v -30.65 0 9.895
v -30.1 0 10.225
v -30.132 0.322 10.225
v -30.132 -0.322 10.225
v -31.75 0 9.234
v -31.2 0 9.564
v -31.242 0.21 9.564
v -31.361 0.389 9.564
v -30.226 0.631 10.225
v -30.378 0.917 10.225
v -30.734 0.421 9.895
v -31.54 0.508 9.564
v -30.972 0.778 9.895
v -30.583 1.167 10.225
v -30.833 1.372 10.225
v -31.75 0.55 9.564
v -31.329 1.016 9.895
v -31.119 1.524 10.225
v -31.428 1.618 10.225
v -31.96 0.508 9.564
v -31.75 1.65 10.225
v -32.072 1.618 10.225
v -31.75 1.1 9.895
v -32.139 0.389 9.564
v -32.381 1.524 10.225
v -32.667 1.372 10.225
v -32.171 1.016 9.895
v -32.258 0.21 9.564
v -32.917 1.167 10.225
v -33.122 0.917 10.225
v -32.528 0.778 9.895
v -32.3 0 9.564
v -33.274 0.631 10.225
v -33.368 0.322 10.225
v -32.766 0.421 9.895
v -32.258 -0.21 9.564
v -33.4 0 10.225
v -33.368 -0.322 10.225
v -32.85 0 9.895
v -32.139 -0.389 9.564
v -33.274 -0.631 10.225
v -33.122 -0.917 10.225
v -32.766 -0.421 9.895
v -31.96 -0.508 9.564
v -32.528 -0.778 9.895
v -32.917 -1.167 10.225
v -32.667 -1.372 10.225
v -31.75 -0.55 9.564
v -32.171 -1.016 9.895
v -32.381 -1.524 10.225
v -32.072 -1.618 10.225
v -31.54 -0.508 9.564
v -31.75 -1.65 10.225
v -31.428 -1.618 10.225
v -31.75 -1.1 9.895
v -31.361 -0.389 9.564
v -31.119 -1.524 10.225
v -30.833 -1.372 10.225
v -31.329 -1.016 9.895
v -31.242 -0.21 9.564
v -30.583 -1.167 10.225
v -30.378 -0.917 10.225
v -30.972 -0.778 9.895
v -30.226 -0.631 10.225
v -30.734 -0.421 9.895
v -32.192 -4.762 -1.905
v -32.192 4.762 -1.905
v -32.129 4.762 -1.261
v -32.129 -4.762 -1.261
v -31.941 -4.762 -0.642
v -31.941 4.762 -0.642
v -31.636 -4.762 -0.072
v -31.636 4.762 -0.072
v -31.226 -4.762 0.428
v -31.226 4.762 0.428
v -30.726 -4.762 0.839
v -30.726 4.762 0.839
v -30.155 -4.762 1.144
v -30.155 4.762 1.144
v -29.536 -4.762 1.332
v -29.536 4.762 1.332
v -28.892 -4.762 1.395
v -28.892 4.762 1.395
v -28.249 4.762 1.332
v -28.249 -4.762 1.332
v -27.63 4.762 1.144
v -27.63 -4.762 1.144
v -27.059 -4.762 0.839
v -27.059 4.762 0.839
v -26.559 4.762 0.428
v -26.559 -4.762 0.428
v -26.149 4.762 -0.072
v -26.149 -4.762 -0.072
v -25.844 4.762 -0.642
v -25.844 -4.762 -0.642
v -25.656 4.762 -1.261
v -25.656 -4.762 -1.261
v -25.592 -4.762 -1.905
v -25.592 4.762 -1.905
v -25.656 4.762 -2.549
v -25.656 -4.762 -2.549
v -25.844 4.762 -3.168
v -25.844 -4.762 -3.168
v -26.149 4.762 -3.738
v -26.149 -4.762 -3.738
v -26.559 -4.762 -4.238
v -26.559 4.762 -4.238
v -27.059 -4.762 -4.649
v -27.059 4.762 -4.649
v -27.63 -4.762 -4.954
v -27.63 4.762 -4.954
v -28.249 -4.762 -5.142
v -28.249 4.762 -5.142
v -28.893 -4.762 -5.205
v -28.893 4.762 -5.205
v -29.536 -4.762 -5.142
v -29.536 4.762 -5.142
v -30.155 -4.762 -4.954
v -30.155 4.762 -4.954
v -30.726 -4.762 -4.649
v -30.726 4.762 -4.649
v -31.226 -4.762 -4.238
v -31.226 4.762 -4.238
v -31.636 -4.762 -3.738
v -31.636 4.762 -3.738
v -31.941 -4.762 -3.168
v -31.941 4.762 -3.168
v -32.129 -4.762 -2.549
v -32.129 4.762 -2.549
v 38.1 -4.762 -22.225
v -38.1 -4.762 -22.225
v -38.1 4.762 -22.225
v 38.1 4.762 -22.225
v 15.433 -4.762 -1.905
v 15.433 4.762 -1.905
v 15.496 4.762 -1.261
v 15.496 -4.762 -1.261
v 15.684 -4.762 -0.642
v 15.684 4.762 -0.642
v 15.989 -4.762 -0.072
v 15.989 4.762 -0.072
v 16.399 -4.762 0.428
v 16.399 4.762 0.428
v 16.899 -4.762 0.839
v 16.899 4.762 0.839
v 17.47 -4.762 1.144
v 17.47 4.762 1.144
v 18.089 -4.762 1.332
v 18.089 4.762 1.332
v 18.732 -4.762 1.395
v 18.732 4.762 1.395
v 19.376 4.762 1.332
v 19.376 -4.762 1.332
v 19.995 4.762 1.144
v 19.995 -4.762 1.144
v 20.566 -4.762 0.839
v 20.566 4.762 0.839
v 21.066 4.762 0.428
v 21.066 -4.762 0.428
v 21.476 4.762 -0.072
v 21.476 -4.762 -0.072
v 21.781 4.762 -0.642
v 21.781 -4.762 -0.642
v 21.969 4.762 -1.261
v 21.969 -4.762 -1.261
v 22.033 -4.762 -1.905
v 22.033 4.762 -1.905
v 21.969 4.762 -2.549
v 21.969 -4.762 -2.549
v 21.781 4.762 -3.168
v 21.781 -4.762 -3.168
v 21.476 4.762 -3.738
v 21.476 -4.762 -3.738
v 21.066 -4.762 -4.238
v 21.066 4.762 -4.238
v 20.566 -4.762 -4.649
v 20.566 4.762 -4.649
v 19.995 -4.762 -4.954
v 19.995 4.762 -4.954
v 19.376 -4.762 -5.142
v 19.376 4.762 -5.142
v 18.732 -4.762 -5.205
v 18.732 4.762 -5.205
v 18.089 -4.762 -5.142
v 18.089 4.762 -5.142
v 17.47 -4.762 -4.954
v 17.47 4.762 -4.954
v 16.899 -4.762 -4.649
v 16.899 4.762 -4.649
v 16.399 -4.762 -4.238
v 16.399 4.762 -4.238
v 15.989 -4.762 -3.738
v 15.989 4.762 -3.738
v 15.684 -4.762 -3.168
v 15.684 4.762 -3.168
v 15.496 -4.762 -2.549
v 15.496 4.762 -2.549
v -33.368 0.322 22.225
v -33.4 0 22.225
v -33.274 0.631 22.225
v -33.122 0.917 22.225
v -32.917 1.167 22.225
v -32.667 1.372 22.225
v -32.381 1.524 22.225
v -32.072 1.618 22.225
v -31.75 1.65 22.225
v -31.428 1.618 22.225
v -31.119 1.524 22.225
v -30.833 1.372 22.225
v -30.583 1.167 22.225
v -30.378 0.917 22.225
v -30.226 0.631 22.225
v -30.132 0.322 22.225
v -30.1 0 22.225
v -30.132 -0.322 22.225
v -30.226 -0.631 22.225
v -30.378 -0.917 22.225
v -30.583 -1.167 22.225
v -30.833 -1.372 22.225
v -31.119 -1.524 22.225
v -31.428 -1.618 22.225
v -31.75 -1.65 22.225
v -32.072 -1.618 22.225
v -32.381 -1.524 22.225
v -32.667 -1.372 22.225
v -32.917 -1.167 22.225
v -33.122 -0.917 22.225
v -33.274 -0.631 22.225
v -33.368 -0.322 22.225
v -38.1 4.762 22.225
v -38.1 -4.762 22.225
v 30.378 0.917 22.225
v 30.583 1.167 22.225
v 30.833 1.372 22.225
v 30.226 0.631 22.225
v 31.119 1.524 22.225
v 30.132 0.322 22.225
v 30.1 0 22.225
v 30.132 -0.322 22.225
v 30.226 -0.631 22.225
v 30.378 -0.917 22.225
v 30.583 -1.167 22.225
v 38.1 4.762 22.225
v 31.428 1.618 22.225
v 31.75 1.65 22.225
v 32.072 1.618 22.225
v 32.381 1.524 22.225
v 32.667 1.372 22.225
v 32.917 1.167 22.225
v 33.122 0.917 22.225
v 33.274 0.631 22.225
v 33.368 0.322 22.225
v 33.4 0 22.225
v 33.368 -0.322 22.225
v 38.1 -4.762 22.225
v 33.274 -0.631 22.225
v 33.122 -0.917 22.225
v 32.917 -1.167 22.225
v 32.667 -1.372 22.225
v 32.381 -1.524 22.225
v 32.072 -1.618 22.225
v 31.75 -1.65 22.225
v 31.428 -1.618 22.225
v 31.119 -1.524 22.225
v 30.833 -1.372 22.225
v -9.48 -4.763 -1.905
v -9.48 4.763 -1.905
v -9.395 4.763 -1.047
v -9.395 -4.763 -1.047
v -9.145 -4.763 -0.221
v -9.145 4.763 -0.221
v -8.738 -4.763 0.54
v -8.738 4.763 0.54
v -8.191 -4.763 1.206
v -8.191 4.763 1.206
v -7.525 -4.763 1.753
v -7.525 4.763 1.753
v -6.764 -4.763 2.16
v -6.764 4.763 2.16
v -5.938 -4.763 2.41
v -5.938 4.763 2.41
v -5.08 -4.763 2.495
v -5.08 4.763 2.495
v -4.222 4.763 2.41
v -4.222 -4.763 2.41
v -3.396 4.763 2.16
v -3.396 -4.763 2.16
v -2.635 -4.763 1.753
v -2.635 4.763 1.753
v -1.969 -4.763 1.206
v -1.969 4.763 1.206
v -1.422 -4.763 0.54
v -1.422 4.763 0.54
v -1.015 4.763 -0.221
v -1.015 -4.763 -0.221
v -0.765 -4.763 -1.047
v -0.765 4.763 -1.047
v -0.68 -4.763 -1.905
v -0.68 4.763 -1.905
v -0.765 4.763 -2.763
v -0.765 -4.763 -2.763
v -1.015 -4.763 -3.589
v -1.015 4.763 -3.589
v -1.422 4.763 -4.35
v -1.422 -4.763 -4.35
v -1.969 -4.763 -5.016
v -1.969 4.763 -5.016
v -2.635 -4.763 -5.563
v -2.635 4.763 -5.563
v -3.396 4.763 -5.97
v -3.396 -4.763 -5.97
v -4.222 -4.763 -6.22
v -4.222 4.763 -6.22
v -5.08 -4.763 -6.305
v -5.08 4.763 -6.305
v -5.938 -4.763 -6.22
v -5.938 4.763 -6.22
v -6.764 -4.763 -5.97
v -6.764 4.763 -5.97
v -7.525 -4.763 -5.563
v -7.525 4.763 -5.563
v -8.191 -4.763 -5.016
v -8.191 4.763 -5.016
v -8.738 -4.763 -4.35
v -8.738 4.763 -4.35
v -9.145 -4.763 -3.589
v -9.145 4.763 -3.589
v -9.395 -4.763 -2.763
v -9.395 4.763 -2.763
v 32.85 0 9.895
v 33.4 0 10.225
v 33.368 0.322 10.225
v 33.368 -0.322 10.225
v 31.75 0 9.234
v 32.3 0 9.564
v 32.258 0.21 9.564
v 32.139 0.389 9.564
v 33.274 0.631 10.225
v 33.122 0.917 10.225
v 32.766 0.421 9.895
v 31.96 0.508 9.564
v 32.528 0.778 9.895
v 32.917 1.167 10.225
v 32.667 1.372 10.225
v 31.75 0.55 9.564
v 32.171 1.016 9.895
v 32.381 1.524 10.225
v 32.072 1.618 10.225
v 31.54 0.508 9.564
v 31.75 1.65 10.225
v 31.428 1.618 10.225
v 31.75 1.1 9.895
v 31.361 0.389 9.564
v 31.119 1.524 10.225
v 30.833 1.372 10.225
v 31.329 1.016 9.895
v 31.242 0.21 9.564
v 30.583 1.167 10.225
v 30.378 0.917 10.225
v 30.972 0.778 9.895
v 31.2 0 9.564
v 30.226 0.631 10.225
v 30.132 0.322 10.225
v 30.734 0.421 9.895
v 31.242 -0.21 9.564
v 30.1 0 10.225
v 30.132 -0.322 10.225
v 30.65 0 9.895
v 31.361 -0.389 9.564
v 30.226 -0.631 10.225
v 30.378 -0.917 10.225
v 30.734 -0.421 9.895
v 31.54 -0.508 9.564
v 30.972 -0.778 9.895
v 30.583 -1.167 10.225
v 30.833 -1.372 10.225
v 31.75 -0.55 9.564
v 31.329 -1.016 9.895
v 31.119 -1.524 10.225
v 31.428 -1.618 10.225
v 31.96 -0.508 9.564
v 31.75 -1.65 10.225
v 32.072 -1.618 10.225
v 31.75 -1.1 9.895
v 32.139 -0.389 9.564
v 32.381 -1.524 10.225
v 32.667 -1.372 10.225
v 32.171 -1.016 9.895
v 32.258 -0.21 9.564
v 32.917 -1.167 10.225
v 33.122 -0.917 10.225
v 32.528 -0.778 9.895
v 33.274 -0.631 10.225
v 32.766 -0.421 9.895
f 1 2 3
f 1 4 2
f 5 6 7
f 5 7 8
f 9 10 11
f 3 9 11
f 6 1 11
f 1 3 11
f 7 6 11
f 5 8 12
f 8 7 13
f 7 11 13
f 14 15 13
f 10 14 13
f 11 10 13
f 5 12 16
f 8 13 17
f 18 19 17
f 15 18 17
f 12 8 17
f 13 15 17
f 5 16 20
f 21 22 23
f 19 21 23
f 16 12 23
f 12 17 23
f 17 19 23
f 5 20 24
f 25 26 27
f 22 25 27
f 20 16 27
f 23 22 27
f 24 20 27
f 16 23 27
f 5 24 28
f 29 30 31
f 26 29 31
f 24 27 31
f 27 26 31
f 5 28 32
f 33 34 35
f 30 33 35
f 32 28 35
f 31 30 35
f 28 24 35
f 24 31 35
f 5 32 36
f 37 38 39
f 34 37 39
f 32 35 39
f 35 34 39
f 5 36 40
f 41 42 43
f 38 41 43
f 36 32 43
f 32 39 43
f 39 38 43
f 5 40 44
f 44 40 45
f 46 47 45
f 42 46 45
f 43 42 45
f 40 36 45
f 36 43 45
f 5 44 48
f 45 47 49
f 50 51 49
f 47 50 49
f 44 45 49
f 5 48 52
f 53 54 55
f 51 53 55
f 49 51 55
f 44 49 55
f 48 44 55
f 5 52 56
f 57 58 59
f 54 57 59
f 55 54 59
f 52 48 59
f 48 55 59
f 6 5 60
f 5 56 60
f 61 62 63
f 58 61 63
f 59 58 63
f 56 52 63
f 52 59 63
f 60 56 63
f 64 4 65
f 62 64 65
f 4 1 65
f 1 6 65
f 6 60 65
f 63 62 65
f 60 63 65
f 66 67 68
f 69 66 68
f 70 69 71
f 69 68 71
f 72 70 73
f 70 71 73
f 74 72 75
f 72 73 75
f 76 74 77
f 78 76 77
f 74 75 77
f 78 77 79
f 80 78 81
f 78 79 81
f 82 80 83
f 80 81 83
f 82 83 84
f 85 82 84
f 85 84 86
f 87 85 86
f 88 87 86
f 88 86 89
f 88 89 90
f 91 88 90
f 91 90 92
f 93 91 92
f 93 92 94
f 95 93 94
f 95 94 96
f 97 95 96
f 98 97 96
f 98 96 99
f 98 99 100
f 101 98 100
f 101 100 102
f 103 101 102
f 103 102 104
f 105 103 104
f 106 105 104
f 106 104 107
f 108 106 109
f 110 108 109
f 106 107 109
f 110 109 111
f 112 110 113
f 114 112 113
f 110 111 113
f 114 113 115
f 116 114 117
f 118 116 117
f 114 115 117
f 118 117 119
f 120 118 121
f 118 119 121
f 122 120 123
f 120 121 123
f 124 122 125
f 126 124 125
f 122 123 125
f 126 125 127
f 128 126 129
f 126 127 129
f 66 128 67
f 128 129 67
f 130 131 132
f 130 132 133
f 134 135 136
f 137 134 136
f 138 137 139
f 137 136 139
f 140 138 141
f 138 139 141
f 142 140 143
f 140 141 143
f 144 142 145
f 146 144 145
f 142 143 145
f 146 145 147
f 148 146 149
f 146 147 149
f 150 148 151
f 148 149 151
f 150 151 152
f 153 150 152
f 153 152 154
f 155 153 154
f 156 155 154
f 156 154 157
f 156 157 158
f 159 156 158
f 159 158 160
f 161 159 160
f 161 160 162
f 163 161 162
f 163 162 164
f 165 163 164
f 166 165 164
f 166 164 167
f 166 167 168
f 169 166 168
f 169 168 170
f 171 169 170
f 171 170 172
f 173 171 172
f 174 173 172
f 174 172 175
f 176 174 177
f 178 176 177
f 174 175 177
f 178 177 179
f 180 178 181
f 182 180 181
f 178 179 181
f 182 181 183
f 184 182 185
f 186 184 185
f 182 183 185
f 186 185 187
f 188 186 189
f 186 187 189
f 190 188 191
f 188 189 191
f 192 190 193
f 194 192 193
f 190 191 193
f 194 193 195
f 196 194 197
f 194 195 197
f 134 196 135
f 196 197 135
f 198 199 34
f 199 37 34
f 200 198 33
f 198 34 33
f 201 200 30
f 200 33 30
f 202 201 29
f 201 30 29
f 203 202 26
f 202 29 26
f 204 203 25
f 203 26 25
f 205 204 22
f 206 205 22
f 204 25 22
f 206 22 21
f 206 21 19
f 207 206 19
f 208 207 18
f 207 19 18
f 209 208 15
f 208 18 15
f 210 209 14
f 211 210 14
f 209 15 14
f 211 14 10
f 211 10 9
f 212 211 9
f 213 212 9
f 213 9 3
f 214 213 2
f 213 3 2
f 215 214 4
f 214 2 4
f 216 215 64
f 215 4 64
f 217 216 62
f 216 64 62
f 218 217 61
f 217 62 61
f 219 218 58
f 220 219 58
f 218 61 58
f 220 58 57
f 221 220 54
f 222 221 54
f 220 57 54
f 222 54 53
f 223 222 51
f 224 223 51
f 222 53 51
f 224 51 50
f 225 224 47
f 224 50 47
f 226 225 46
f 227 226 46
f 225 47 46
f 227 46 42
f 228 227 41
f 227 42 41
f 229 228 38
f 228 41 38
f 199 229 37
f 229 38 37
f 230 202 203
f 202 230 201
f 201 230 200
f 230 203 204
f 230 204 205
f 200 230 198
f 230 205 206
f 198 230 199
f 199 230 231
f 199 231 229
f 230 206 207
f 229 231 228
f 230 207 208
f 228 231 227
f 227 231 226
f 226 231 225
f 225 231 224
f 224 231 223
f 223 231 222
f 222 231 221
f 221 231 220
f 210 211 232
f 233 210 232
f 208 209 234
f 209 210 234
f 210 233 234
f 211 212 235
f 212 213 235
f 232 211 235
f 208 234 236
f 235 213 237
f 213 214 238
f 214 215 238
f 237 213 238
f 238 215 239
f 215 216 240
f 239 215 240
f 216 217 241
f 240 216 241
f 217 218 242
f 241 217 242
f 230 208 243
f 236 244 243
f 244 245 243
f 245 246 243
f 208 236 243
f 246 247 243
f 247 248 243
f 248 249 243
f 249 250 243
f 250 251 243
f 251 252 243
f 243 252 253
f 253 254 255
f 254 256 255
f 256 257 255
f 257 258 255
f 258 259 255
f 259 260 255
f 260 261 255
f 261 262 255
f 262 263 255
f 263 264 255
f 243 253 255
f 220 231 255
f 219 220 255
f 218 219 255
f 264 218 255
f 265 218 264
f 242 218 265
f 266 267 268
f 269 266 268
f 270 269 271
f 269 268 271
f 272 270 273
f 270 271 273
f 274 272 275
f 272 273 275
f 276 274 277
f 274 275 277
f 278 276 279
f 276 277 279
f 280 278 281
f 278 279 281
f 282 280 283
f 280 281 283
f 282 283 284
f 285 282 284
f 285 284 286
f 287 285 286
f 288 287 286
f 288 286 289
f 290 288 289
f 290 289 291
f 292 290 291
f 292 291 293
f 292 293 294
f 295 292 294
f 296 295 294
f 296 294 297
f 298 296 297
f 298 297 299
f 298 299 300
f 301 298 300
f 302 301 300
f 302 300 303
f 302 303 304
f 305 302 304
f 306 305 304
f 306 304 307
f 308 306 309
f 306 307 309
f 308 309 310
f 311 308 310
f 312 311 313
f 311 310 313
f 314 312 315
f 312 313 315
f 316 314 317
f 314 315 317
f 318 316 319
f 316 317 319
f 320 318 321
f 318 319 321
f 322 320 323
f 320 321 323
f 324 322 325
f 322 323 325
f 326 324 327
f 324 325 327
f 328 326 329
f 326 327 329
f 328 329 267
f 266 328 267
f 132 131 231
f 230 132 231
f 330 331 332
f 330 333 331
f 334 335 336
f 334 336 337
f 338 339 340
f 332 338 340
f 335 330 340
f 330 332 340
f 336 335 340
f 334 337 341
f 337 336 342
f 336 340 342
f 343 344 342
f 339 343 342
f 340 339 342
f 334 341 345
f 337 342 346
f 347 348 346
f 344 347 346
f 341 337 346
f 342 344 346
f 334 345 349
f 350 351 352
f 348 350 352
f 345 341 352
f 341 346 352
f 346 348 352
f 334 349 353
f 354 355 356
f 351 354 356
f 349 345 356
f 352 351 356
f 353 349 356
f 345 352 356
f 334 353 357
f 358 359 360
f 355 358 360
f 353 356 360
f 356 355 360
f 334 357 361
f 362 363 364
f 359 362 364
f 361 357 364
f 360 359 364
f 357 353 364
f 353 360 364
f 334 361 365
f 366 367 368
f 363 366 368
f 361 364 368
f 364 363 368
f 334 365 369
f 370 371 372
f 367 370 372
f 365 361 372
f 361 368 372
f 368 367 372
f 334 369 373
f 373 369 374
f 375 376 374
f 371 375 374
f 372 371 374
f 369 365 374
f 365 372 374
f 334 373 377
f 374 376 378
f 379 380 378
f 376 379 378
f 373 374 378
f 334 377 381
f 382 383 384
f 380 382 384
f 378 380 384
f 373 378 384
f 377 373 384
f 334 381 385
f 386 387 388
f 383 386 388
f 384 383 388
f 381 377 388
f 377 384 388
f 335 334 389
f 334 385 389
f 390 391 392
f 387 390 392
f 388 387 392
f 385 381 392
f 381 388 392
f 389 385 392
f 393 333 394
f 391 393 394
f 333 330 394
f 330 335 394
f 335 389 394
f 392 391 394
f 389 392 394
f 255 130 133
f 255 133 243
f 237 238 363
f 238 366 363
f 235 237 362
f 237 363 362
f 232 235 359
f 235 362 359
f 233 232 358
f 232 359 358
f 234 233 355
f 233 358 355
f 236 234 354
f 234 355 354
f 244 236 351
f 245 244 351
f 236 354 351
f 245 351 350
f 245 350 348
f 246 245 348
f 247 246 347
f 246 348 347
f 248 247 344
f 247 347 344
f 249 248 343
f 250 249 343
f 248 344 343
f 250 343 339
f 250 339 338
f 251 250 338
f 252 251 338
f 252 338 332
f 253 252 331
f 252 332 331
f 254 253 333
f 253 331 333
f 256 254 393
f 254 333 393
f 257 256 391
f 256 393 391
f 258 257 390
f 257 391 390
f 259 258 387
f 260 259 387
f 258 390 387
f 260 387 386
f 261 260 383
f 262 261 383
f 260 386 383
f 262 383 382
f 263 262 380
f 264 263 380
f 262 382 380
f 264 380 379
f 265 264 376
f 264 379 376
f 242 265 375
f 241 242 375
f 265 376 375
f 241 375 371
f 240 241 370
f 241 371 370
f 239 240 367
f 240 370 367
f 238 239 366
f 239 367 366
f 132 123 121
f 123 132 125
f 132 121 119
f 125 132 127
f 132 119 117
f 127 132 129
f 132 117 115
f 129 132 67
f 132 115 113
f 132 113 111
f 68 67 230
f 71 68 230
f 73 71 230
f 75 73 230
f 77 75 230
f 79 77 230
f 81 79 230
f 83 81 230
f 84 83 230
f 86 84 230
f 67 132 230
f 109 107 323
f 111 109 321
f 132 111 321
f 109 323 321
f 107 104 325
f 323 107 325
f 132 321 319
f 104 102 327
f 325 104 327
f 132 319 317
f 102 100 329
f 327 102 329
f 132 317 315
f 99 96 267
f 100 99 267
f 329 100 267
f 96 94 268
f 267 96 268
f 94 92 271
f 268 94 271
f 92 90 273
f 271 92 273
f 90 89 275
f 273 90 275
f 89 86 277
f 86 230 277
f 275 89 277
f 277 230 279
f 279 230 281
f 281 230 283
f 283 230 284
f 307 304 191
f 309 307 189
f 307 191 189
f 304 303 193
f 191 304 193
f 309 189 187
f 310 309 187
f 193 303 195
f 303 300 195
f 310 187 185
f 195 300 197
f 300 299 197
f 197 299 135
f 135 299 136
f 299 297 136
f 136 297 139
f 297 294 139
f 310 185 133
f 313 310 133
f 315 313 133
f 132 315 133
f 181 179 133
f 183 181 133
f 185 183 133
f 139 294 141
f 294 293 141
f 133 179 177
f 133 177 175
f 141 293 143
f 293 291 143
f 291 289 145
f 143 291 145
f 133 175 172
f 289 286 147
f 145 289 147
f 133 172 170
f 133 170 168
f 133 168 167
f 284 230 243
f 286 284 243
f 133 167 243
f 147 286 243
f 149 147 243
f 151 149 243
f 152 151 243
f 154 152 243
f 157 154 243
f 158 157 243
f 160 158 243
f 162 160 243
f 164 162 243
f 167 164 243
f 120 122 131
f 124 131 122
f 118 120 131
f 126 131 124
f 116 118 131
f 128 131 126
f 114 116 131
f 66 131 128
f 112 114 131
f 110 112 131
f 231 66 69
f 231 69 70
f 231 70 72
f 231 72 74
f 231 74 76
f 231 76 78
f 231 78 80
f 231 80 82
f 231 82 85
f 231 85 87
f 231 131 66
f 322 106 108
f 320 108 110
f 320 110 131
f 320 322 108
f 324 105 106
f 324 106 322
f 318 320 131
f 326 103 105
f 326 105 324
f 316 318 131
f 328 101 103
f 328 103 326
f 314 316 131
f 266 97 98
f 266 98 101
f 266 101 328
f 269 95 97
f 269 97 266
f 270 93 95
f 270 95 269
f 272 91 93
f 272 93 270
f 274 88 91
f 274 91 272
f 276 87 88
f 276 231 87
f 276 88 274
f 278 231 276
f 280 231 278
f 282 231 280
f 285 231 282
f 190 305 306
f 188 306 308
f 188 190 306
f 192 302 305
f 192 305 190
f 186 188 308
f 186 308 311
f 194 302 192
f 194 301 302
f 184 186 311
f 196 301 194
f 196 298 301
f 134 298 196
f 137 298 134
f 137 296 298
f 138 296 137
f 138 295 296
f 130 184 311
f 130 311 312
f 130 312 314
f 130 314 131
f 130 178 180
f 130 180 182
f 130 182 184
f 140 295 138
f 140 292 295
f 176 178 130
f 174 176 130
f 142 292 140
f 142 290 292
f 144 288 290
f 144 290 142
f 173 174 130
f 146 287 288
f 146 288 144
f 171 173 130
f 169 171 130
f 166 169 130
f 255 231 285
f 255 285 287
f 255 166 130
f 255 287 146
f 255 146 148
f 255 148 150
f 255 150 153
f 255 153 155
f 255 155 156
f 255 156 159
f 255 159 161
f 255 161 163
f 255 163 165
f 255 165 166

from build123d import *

# Parameters (mm, degrees)
F0_W     = 76.2
F0_H     = 44.45
F1_DEPTH = 4.7625
F3_D     = 3.3
F3_DEPTH = 12
F3_TIP   = 0.9914200214
F5_D     = 6.6
F5_DEPTH = 12.7
F5_TIP   = 1.9828400428
F7_D     = 8.8


with BuildPart() as f1:
    # F0 (on Front) → F1 (new body, symmetric)
    with BuildSketch(Plane.XZ):
        Rectangle(F0_W, F0_H)
    extrude(amount=F1_DEPTH, both=True)

    # F3
    with Locations(Plane.XY.offset(22.225)):
        with Locations((-31.75, 0), (31.75, 0)):
            Hole(F3_D / 2, depth=F3_DEPTH)
            with Locations((0, 0, -(F3_DEPTH + F3_TIP / 2))):  # 118° drill point
                Cone(0, F3_D / 2, F3_TIP, mode=Mode.SUBTRACT)

    # F5
    with Locations(Plane.XZ.offset(4.7625)):
        with Locations((-28.8925, -1.905), (18.7325, -1.905)):
            Hole(F5_D / 2, depth=F5_DEPTH)
            with Locations((0, 0, -(F5_DEPTH + F5_TIP / 2))):  # 118° drill point
                Cone(0, F5_D / 2, F5_TIP, mode=Mode.SUBTRACT)

    # F7 (through all)
    with Locations(Plane.XZ.offset(4.7625)):
        with Locations((-5.08, -1.905)):
            Hole(F7_D / 2)


solid = f1.part
